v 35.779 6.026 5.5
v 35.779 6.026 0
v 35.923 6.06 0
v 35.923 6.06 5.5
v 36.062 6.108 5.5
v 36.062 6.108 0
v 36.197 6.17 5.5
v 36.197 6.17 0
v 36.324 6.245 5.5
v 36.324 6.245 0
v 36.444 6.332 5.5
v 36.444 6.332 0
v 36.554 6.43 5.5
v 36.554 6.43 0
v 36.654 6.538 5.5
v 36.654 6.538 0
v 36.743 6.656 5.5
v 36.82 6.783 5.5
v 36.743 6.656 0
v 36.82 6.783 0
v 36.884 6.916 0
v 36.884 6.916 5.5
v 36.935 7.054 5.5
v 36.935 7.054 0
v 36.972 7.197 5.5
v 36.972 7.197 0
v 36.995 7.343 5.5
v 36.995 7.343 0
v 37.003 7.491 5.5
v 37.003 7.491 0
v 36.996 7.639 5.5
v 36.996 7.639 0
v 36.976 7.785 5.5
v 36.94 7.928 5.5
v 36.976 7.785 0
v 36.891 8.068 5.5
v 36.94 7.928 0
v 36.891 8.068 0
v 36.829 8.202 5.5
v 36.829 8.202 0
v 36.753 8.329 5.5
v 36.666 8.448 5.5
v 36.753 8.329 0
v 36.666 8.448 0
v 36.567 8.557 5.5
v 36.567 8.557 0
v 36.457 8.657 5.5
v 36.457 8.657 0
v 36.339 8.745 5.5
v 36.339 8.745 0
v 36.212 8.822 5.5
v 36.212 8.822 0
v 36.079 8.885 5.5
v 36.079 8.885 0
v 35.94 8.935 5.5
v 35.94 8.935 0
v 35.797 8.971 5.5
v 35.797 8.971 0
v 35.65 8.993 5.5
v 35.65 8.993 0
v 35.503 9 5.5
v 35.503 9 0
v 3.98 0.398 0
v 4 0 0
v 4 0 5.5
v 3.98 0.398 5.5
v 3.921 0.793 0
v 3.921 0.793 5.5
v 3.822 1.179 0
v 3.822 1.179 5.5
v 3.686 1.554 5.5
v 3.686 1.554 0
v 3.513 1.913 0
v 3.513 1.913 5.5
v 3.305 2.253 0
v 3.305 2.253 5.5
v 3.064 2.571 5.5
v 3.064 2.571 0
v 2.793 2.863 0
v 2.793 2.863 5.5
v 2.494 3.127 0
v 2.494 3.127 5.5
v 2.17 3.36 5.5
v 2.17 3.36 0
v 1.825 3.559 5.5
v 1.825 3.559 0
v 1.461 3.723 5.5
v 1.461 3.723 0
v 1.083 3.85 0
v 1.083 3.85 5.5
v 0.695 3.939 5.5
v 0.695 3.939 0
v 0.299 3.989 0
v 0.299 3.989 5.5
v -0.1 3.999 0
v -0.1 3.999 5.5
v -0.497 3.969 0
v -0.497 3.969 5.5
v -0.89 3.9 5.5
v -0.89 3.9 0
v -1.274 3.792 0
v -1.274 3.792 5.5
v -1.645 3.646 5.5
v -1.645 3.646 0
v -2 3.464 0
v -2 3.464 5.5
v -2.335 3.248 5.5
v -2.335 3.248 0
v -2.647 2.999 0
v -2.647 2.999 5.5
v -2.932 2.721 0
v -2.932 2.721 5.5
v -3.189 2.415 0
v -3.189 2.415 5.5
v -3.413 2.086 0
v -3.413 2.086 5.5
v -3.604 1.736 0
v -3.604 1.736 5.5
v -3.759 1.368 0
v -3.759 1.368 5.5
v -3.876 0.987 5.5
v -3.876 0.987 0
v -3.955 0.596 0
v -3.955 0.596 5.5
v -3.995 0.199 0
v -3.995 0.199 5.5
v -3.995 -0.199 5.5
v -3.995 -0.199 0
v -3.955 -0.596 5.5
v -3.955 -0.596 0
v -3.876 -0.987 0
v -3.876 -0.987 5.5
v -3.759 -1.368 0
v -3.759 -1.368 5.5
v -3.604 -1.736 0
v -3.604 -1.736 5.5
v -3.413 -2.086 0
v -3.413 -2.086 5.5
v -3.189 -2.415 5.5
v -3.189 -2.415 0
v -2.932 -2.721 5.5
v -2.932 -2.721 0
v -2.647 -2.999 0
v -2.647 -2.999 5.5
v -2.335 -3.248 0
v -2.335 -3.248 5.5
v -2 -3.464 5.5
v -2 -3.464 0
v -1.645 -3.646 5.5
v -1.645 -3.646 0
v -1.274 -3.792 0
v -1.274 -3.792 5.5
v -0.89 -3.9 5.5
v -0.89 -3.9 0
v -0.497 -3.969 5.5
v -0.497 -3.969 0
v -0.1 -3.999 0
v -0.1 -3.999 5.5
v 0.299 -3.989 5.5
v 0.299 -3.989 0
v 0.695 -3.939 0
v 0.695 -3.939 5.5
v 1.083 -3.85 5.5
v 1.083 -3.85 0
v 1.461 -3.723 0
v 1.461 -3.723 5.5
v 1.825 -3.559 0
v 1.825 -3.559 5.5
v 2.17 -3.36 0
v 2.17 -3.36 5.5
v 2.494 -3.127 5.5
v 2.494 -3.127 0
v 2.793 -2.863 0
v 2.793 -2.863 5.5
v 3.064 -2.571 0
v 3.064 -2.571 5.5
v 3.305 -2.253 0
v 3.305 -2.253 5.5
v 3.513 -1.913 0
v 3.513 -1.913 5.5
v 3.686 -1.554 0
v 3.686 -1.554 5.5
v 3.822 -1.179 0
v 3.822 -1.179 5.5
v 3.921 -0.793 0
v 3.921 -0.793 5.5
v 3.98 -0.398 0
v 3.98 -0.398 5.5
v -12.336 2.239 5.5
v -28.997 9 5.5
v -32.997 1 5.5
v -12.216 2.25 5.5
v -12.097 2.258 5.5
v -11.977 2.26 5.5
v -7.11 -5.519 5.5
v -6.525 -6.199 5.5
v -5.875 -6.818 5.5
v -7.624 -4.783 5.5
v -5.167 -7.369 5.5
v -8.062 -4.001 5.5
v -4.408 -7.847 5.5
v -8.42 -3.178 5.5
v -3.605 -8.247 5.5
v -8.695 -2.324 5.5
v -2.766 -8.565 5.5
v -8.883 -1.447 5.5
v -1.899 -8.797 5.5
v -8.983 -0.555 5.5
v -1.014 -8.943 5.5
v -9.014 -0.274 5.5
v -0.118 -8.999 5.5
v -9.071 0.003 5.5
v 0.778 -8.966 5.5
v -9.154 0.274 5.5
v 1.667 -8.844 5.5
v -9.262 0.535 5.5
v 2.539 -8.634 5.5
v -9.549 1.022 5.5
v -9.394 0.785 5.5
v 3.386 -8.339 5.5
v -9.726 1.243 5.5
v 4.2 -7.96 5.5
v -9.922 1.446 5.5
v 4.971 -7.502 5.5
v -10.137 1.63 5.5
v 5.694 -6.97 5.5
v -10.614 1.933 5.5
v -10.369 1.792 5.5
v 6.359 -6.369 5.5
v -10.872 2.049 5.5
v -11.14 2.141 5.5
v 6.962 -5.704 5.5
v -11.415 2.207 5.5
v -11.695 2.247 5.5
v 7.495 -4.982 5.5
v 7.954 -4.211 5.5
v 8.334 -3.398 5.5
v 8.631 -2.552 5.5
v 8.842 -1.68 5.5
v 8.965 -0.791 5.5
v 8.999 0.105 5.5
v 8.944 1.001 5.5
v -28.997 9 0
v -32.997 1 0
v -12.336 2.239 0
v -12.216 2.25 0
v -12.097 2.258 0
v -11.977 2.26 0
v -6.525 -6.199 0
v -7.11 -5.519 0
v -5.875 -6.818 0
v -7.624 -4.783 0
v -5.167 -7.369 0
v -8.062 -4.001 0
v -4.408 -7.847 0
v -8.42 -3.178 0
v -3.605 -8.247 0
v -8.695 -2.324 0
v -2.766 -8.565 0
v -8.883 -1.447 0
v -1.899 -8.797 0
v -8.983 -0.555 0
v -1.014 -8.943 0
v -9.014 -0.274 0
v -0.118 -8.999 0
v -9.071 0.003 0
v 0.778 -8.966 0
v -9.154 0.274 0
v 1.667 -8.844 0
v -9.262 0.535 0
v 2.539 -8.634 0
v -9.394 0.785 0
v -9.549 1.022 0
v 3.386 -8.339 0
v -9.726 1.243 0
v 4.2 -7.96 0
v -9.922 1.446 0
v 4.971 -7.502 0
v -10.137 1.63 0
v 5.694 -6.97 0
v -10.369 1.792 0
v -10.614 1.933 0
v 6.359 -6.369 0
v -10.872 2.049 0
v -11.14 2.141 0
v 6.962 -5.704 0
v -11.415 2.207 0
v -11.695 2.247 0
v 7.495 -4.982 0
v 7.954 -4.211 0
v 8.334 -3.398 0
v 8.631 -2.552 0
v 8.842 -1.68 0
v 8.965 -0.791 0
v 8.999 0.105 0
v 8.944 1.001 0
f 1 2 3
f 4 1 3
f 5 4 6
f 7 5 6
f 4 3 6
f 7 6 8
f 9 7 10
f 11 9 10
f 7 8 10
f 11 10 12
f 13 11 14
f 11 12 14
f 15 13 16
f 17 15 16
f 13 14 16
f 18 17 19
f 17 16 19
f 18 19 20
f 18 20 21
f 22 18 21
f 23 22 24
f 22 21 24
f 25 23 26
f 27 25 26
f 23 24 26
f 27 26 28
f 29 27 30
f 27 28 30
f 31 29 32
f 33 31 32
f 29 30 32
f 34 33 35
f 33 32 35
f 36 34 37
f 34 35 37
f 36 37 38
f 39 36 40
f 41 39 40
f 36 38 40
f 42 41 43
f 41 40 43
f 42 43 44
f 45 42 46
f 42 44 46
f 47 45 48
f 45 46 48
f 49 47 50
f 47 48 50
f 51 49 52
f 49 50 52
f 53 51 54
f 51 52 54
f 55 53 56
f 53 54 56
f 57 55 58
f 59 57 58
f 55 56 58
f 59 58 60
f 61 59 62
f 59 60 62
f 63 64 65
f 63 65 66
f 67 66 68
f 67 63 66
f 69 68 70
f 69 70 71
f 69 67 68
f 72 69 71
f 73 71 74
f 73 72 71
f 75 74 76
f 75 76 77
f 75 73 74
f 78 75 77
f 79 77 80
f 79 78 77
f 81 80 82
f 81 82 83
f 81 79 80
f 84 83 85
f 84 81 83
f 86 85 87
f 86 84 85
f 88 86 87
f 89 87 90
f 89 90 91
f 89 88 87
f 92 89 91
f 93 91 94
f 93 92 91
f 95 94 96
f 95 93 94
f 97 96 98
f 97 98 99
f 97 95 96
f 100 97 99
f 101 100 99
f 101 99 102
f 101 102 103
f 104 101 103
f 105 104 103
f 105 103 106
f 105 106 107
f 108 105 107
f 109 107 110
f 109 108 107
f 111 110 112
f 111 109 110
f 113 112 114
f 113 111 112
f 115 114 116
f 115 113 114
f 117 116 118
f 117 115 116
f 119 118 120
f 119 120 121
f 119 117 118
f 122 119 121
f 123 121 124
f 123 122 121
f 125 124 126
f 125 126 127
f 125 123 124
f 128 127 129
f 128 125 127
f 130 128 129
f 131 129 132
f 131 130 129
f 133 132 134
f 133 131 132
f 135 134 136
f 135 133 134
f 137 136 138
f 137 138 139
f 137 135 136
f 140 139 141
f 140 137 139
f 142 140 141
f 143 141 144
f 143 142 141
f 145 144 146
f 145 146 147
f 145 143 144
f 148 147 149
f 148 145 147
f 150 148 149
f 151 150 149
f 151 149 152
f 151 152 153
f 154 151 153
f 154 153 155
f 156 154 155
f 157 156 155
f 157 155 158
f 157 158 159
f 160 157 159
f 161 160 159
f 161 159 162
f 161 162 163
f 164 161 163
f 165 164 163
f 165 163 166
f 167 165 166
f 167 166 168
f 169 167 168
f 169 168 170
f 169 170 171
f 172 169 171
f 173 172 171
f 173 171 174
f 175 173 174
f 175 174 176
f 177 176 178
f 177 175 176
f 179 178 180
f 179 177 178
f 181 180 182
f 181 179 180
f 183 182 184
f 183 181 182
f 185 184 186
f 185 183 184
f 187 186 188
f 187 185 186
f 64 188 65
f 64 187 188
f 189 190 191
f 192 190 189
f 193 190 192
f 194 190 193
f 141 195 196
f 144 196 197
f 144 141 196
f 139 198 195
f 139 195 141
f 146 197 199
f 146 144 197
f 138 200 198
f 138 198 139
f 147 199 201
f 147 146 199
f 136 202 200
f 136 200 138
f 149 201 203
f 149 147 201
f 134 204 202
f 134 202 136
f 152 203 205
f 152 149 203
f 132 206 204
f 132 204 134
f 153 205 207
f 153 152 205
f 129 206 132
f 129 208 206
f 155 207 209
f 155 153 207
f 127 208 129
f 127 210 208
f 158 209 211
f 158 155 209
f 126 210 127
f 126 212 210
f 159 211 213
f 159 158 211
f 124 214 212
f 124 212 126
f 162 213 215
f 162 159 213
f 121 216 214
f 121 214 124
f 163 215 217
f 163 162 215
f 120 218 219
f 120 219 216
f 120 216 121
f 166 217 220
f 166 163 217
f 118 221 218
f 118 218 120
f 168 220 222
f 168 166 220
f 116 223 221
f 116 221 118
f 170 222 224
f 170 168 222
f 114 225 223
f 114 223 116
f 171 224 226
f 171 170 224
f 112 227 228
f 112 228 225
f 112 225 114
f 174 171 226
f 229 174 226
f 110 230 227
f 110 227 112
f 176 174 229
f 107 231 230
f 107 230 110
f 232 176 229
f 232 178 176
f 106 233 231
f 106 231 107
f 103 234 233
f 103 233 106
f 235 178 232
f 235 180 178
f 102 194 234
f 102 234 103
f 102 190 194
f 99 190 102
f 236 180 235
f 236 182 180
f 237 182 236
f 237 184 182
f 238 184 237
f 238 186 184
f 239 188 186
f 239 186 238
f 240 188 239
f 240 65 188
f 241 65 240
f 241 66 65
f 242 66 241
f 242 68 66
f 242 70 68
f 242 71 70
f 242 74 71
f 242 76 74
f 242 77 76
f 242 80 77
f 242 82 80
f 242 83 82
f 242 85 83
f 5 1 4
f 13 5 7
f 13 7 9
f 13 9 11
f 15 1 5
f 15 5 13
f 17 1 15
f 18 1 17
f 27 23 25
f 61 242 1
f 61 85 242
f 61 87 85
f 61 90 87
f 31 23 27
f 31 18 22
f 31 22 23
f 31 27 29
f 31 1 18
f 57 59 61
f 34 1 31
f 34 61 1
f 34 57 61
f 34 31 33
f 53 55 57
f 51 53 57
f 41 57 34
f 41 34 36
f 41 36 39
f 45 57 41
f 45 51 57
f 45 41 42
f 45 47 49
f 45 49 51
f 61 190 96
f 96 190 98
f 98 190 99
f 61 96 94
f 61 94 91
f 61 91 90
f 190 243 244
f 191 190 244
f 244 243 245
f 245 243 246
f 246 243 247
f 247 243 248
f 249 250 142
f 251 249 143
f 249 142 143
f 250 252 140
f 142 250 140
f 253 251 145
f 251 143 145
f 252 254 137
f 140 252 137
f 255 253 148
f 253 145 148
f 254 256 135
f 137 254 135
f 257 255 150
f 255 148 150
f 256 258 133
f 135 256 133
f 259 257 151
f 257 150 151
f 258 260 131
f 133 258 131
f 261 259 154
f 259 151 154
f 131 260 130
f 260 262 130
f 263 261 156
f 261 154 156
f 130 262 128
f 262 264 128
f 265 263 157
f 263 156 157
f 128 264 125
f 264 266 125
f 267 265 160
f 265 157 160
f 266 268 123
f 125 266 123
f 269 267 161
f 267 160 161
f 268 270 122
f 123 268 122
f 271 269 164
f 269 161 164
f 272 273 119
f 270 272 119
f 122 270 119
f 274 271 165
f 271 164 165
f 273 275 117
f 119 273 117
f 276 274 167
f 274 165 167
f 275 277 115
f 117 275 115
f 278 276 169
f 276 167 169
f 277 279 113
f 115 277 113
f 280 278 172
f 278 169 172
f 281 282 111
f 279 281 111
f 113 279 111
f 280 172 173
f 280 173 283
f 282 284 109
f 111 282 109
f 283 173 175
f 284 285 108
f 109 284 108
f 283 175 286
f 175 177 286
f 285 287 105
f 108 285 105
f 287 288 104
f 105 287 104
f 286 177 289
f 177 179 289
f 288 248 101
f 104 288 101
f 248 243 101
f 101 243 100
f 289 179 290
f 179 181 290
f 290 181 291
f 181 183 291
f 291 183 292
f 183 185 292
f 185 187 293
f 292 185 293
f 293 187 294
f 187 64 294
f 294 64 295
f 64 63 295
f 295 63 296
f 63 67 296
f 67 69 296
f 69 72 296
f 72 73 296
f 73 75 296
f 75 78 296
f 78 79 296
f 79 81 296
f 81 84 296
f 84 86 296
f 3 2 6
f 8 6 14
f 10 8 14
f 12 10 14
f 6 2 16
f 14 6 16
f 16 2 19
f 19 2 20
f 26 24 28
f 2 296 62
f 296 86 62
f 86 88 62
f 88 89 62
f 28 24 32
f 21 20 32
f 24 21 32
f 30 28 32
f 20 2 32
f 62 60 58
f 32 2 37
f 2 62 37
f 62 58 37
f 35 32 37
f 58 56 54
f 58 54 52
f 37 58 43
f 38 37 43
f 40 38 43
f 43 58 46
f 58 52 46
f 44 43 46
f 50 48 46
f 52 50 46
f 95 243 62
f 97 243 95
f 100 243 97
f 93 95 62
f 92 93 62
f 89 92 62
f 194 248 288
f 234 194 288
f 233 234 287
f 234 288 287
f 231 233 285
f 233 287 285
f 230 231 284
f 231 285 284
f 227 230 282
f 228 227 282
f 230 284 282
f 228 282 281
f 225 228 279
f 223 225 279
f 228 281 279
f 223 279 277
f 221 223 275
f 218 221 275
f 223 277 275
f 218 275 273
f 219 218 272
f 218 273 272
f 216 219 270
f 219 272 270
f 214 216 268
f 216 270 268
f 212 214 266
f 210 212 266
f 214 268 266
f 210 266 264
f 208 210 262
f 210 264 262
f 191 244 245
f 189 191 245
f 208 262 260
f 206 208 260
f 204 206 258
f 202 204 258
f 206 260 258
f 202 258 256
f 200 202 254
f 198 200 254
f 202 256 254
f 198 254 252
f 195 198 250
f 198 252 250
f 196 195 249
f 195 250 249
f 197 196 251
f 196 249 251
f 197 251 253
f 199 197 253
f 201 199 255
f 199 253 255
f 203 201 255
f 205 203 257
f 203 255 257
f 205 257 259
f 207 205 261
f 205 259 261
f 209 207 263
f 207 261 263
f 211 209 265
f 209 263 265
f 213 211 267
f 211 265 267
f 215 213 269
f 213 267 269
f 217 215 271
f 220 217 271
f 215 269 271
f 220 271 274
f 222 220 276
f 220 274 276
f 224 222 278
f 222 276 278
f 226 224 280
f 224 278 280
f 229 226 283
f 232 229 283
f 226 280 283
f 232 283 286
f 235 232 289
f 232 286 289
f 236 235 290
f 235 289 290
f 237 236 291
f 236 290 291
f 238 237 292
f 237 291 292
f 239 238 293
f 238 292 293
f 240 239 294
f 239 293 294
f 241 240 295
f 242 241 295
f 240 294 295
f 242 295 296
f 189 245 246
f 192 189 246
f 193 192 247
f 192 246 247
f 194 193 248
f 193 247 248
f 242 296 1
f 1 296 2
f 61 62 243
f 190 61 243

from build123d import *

# Parameters (mm, degrees)
SKETCH1_R           = 4
BOSS_EXTRUDE1_DEPTH = 5.5


with BuildPart() as part:
    # Sketch1 → Boss-Extrude1 (new body)
    with BuildSketch(Plane.XY):
        with BuildLine():
            ThreePointArc((-12.335531392, 2.238518271), (-12.156668127, 2.254624752), (-11.9771616, 2.26))
            ThreePointArc((-11.9771616, 2.26), (-9.922289344, 1.445749302), (-8.982871201, -0.554999992))
            ThreePointArc((-8.982871201, -0.554999992), (0.778132217, -8.966298582), (8.944184276, 1.000783512))
            Line((8.944184276, 1.000783512), (35.778917143, 6.025625378))
            ThreePointArc((35.778917143, 6.025625378), (36.996418316, 7.638632727), (35.5028384, 9))
            Line((35.5028384, 9), (-28.9971616, 9))
            Line((-28.9971616, 9), (-32.9971616, 1))
            Line((-32.9971616, 1), (-12.335531392, 2.238518271))
        make_face()
        Circle(SKETCH1_R, mode=Mode.SUBTRACT)
    extrude(amount=BOSS_EXTRUDE1_DEPTH)


solid = part.part
